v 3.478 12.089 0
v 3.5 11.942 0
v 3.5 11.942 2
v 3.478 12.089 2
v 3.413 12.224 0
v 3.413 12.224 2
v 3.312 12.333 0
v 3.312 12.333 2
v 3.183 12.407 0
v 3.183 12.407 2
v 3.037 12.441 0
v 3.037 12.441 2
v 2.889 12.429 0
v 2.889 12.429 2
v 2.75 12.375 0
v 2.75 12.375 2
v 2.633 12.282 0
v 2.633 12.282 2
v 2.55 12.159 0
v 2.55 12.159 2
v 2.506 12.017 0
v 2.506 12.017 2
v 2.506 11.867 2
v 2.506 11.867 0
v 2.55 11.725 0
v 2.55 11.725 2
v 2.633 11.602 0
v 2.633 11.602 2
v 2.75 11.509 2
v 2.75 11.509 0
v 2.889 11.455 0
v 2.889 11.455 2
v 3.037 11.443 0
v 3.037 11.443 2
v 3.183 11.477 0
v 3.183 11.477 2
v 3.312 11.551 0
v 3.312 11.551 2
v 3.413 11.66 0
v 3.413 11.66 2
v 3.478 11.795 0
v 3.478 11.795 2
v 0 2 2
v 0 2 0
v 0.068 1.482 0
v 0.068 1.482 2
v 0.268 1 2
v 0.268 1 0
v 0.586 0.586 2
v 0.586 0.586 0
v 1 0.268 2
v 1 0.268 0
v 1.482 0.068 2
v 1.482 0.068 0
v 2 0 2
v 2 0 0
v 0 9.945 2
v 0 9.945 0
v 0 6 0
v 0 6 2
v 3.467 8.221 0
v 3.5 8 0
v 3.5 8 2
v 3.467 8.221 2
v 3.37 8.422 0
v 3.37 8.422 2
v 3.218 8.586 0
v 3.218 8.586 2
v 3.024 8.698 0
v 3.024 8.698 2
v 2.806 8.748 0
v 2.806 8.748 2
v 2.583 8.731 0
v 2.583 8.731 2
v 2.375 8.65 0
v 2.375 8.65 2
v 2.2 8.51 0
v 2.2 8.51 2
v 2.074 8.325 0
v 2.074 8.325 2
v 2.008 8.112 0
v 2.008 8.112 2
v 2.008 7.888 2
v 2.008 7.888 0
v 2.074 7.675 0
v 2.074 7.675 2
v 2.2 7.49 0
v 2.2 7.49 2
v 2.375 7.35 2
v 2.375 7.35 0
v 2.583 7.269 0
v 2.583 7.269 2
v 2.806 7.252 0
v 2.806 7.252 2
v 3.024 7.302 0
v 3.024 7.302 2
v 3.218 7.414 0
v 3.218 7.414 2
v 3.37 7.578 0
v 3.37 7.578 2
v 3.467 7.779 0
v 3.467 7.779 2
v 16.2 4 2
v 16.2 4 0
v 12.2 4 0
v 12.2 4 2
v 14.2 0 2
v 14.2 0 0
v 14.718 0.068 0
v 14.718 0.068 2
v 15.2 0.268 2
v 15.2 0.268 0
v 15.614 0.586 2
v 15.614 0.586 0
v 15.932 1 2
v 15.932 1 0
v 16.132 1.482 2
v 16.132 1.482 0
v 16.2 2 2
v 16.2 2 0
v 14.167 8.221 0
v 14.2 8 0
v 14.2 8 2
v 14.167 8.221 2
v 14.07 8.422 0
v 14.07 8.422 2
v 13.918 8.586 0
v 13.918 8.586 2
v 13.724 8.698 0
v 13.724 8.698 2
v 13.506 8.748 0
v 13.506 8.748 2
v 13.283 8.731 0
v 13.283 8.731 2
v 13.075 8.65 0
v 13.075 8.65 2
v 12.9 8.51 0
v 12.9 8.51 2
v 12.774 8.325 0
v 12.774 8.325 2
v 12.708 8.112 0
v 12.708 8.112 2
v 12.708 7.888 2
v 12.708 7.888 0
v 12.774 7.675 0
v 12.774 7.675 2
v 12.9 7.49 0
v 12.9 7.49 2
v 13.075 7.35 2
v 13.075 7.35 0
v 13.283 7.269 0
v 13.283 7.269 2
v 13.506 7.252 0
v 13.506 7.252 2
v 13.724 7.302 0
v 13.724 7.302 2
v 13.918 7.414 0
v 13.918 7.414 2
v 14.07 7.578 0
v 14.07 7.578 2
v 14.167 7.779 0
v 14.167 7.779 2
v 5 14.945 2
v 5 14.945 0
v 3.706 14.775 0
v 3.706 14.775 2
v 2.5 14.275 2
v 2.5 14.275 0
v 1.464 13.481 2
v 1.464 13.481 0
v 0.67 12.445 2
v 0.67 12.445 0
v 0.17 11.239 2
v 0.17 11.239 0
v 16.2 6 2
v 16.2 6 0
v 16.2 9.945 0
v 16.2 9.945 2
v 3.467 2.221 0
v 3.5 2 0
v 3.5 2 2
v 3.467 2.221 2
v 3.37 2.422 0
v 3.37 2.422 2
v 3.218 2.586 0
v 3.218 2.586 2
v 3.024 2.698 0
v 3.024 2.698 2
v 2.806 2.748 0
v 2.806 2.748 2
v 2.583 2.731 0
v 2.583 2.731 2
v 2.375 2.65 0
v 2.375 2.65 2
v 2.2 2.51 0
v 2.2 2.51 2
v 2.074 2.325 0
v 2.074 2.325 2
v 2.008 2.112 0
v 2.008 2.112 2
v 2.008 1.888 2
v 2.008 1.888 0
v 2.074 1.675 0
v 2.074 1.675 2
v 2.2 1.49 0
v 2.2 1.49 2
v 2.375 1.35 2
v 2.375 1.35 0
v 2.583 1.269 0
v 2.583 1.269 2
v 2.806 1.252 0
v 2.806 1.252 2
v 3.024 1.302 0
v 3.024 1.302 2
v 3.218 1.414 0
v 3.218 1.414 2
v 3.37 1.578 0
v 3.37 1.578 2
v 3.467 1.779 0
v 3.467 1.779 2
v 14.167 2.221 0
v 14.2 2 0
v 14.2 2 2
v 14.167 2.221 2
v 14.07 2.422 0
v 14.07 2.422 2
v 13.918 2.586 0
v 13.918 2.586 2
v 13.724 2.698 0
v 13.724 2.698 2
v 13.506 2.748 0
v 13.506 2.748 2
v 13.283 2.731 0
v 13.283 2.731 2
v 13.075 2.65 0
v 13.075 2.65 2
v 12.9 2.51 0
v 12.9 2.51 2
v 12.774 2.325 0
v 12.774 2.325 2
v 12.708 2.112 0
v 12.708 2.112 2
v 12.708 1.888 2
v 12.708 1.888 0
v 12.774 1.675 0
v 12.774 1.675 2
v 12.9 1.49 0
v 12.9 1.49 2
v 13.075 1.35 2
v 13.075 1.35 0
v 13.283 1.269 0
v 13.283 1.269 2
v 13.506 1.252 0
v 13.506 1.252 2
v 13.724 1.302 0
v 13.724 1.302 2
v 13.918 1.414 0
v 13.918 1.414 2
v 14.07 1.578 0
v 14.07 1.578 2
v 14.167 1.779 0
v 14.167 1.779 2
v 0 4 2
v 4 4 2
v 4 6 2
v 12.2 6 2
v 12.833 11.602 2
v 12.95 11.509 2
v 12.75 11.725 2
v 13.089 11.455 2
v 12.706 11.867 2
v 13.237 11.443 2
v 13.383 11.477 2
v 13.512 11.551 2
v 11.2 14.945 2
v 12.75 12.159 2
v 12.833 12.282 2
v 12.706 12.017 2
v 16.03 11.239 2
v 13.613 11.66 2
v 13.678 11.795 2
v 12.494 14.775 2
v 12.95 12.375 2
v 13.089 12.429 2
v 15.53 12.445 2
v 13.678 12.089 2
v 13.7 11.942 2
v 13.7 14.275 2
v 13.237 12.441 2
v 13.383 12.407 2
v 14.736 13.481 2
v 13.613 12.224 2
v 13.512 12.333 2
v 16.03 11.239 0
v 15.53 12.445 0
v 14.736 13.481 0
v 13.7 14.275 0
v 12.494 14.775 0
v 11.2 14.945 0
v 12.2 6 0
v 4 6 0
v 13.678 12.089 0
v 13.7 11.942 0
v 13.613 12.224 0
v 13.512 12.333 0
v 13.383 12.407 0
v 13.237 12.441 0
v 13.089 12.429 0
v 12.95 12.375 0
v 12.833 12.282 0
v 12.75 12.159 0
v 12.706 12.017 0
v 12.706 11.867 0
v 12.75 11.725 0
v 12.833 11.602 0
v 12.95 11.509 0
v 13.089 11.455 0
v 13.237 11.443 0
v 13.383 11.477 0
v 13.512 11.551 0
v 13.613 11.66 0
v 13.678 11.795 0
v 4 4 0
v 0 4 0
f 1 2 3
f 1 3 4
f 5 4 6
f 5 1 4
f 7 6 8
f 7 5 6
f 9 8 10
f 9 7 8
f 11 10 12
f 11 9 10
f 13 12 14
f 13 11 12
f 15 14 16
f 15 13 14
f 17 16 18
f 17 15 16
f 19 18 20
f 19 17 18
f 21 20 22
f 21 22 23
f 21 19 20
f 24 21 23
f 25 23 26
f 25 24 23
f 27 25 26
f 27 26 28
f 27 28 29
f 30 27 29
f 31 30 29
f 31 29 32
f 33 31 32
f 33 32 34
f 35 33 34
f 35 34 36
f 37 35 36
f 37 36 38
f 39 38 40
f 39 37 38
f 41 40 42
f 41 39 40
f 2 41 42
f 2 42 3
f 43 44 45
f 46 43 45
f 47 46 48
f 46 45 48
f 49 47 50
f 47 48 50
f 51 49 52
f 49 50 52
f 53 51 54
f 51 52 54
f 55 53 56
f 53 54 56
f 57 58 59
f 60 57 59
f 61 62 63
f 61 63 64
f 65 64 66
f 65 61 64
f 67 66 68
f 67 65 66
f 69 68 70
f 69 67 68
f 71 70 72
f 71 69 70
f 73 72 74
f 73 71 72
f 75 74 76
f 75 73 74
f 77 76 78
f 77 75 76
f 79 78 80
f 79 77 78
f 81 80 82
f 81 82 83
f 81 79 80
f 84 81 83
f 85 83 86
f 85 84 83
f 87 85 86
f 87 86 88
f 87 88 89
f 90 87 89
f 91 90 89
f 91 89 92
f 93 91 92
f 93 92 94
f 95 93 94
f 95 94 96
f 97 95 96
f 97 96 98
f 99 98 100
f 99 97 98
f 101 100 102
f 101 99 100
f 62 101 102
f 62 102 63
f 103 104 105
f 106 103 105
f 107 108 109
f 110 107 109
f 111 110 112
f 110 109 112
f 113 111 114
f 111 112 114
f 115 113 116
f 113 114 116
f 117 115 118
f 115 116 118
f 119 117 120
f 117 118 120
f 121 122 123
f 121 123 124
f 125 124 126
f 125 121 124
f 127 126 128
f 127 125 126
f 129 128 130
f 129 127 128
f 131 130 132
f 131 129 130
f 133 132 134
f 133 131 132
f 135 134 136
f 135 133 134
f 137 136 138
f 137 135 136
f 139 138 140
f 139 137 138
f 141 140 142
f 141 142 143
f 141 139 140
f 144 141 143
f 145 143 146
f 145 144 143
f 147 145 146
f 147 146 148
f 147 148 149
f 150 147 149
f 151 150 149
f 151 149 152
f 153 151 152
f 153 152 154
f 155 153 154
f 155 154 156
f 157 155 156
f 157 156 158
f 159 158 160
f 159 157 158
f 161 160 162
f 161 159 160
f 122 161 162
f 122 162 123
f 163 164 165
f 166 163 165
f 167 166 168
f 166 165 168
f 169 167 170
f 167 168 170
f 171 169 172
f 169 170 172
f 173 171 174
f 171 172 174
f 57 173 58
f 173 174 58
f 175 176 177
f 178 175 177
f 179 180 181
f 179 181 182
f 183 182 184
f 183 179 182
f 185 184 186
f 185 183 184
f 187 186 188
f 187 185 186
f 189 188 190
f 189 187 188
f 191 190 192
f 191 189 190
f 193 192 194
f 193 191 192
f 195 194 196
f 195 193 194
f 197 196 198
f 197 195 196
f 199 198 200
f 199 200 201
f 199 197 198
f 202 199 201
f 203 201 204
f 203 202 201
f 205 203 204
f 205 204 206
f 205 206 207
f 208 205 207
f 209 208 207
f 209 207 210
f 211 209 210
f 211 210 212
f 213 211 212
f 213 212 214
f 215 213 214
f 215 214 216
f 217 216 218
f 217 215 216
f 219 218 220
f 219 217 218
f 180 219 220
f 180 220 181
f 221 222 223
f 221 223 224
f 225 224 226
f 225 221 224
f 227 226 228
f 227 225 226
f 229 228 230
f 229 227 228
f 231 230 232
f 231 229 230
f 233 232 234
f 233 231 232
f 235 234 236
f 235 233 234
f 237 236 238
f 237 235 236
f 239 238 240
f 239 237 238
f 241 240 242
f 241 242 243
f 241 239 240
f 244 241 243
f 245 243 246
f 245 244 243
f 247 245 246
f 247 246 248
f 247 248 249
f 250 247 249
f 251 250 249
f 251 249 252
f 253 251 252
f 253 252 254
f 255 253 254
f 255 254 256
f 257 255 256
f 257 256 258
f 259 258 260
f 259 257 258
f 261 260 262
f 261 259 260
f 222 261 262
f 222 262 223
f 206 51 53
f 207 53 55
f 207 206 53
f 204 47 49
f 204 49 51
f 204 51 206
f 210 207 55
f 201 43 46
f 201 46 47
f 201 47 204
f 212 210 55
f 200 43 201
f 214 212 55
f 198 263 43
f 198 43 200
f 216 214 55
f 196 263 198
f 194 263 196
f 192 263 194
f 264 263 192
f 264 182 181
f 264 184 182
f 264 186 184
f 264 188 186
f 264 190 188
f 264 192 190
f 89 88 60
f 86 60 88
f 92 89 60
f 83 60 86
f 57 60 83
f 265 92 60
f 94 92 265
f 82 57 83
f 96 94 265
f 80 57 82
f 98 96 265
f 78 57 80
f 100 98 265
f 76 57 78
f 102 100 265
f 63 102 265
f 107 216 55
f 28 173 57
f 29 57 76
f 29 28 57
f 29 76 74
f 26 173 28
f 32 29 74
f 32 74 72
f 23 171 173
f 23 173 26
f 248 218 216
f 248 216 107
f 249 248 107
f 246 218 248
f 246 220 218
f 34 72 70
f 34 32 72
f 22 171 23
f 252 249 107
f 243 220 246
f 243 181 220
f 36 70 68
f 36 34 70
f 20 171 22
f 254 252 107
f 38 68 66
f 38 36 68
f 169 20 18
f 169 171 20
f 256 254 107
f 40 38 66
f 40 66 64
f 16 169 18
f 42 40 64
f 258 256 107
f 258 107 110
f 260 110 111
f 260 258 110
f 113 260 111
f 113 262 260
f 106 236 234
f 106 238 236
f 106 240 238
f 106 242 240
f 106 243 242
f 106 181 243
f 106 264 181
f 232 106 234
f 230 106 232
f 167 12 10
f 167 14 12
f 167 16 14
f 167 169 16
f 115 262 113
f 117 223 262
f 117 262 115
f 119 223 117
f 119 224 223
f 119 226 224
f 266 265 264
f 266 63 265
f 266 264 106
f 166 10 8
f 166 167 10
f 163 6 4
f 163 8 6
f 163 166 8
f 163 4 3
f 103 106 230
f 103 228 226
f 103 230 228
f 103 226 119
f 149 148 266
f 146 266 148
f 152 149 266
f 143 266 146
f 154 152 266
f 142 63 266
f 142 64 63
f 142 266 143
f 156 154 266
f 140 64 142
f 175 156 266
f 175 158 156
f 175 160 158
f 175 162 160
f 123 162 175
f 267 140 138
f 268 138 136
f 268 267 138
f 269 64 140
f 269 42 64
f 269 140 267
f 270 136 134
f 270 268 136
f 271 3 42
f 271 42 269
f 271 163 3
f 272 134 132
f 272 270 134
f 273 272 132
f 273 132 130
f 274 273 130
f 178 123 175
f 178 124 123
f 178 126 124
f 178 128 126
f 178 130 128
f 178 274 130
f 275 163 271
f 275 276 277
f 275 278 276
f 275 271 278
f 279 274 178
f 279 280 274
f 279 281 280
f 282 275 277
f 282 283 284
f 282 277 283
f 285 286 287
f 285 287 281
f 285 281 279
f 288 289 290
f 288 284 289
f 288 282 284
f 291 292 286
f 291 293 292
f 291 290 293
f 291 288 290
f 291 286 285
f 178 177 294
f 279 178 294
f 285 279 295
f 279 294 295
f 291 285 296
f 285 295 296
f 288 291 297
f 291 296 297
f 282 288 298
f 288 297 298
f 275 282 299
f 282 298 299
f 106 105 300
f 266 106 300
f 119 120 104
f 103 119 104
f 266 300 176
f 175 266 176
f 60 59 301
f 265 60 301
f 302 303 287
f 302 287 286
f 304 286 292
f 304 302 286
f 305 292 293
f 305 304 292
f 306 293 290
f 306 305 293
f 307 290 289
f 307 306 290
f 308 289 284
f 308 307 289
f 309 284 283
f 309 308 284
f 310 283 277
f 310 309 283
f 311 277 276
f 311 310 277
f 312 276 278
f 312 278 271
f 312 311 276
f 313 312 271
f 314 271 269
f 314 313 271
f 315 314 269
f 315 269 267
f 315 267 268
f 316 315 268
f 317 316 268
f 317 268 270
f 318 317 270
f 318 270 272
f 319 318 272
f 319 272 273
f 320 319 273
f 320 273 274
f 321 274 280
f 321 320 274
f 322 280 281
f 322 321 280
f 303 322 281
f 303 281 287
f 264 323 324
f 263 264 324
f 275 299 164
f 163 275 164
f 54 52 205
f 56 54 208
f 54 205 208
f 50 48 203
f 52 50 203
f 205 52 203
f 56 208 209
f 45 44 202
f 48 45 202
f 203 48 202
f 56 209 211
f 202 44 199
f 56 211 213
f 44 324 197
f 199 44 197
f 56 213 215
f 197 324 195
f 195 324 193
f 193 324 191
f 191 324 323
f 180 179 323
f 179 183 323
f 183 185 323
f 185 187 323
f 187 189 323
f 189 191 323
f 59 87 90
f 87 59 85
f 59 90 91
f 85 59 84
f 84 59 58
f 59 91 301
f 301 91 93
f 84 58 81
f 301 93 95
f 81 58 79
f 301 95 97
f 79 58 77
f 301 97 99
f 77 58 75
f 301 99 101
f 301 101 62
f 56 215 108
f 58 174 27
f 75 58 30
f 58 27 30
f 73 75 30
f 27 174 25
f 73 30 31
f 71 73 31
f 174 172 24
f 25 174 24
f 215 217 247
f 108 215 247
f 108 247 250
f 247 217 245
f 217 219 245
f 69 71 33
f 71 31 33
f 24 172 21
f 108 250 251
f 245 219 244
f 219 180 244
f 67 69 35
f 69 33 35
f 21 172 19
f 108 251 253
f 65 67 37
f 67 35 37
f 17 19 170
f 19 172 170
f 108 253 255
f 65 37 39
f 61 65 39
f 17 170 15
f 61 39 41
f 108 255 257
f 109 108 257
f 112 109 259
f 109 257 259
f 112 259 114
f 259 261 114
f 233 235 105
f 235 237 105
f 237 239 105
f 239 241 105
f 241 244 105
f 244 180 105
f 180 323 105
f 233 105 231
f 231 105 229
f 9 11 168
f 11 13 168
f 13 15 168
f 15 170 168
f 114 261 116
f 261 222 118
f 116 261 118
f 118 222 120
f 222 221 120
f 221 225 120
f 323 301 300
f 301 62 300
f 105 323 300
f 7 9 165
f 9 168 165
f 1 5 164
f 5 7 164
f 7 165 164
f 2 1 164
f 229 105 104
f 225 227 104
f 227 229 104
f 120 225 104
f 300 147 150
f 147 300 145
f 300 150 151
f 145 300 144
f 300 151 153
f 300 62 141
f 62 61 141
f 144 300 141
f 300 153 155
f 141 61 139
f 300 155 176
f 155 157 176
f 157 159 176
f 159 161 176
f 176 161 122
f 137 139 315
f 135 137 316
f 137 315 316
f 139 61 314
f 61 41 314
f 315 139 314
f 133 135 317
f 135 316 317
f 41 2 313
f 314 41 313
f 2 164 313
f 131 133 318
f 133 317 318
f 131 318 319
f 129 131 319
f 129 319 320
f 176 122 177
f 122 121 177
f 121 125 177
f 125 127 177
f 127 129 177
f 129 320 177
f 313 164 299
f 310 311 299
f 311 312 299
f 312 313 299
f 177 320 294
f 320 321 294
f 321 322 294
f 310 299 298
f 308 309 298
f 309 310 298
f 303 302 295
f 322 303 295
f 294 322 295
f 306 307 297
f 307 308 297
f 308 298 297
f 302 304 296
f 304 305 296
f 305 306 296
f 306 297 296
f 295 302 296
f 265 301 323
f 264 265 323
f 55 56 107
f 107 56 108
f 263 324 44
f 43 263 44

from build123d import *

# Parameters (mm, degrees)
SKETCH2_R           = 0.75
SKETCH2_R_2         = 0.5
BOSS_EXTRUDE1_DEPTH = 2


with BuildPart() as part:
    # Sketch2 → Boss-Extrude1 (new body)
    with BuildSketch(Plane.XY):
        with BuildLine():
            Line((0, 9.945), (0, 6))
            Line((0, 6), (4, 6))
            Line((4, 6), (4, 4))
            Line((4, 4), (0, 4))
            Line((0, 4), (0, 2))
            ThreePointArc((0, 2), (0.585786438, 0.585786438), (2, 0))
            Line((2, 0), (14.2, 0))
            ThreePointArc((14.2, 0), (15.614213562, 0.585786438), (16.2, 2))
            Line((16.2, 2), (16.2, 4))
            Line((16.2, 4), (12.2, 4))
            Line((12.2, 4), (12.2, 6))
            Line((12.2, 6), (16.2, 6))
            Line((16.2, 6), (16.2, 9.945))
            ThreePointArc((16.2, 9.945), (14.735533906, 13.480533906), (11.2, 14.945))
            Line((11.2, 14.945), (5, 14.945))
            ThreePointArc((5, 14.945), (1.464466094, 13.480533906), (0, 9.945))
        make_face()
        with Locations((13.45, 8)):
            Circle(SKETCH2_R, mode=Mode.SUBTRACT)
        with Locations((13.45, 2)):
            Circle(SKETCH2_R, mode=Mode.SUBTRACT)
        with Locations((13.2, 11.942)):
            Circle(SKETCH2_R_2, mode=Mode.SUBTRACT)
        with Locations((3, 11.942)):
            Circle(SKETCH2_R_2, mode=Mode.SUBTRACT)
        with Locations((2.75, 2)):
            Circle(SKETCH2_R, mode=Mode.SUBTRACT)
        with Locations((2.75, 8)):
            Circle(SKETCH2_R, mode=Mode.SUBTRACT)
    extrude(amount=BOSS_EXTRUDE1_DEPTH)


solid = part.part
